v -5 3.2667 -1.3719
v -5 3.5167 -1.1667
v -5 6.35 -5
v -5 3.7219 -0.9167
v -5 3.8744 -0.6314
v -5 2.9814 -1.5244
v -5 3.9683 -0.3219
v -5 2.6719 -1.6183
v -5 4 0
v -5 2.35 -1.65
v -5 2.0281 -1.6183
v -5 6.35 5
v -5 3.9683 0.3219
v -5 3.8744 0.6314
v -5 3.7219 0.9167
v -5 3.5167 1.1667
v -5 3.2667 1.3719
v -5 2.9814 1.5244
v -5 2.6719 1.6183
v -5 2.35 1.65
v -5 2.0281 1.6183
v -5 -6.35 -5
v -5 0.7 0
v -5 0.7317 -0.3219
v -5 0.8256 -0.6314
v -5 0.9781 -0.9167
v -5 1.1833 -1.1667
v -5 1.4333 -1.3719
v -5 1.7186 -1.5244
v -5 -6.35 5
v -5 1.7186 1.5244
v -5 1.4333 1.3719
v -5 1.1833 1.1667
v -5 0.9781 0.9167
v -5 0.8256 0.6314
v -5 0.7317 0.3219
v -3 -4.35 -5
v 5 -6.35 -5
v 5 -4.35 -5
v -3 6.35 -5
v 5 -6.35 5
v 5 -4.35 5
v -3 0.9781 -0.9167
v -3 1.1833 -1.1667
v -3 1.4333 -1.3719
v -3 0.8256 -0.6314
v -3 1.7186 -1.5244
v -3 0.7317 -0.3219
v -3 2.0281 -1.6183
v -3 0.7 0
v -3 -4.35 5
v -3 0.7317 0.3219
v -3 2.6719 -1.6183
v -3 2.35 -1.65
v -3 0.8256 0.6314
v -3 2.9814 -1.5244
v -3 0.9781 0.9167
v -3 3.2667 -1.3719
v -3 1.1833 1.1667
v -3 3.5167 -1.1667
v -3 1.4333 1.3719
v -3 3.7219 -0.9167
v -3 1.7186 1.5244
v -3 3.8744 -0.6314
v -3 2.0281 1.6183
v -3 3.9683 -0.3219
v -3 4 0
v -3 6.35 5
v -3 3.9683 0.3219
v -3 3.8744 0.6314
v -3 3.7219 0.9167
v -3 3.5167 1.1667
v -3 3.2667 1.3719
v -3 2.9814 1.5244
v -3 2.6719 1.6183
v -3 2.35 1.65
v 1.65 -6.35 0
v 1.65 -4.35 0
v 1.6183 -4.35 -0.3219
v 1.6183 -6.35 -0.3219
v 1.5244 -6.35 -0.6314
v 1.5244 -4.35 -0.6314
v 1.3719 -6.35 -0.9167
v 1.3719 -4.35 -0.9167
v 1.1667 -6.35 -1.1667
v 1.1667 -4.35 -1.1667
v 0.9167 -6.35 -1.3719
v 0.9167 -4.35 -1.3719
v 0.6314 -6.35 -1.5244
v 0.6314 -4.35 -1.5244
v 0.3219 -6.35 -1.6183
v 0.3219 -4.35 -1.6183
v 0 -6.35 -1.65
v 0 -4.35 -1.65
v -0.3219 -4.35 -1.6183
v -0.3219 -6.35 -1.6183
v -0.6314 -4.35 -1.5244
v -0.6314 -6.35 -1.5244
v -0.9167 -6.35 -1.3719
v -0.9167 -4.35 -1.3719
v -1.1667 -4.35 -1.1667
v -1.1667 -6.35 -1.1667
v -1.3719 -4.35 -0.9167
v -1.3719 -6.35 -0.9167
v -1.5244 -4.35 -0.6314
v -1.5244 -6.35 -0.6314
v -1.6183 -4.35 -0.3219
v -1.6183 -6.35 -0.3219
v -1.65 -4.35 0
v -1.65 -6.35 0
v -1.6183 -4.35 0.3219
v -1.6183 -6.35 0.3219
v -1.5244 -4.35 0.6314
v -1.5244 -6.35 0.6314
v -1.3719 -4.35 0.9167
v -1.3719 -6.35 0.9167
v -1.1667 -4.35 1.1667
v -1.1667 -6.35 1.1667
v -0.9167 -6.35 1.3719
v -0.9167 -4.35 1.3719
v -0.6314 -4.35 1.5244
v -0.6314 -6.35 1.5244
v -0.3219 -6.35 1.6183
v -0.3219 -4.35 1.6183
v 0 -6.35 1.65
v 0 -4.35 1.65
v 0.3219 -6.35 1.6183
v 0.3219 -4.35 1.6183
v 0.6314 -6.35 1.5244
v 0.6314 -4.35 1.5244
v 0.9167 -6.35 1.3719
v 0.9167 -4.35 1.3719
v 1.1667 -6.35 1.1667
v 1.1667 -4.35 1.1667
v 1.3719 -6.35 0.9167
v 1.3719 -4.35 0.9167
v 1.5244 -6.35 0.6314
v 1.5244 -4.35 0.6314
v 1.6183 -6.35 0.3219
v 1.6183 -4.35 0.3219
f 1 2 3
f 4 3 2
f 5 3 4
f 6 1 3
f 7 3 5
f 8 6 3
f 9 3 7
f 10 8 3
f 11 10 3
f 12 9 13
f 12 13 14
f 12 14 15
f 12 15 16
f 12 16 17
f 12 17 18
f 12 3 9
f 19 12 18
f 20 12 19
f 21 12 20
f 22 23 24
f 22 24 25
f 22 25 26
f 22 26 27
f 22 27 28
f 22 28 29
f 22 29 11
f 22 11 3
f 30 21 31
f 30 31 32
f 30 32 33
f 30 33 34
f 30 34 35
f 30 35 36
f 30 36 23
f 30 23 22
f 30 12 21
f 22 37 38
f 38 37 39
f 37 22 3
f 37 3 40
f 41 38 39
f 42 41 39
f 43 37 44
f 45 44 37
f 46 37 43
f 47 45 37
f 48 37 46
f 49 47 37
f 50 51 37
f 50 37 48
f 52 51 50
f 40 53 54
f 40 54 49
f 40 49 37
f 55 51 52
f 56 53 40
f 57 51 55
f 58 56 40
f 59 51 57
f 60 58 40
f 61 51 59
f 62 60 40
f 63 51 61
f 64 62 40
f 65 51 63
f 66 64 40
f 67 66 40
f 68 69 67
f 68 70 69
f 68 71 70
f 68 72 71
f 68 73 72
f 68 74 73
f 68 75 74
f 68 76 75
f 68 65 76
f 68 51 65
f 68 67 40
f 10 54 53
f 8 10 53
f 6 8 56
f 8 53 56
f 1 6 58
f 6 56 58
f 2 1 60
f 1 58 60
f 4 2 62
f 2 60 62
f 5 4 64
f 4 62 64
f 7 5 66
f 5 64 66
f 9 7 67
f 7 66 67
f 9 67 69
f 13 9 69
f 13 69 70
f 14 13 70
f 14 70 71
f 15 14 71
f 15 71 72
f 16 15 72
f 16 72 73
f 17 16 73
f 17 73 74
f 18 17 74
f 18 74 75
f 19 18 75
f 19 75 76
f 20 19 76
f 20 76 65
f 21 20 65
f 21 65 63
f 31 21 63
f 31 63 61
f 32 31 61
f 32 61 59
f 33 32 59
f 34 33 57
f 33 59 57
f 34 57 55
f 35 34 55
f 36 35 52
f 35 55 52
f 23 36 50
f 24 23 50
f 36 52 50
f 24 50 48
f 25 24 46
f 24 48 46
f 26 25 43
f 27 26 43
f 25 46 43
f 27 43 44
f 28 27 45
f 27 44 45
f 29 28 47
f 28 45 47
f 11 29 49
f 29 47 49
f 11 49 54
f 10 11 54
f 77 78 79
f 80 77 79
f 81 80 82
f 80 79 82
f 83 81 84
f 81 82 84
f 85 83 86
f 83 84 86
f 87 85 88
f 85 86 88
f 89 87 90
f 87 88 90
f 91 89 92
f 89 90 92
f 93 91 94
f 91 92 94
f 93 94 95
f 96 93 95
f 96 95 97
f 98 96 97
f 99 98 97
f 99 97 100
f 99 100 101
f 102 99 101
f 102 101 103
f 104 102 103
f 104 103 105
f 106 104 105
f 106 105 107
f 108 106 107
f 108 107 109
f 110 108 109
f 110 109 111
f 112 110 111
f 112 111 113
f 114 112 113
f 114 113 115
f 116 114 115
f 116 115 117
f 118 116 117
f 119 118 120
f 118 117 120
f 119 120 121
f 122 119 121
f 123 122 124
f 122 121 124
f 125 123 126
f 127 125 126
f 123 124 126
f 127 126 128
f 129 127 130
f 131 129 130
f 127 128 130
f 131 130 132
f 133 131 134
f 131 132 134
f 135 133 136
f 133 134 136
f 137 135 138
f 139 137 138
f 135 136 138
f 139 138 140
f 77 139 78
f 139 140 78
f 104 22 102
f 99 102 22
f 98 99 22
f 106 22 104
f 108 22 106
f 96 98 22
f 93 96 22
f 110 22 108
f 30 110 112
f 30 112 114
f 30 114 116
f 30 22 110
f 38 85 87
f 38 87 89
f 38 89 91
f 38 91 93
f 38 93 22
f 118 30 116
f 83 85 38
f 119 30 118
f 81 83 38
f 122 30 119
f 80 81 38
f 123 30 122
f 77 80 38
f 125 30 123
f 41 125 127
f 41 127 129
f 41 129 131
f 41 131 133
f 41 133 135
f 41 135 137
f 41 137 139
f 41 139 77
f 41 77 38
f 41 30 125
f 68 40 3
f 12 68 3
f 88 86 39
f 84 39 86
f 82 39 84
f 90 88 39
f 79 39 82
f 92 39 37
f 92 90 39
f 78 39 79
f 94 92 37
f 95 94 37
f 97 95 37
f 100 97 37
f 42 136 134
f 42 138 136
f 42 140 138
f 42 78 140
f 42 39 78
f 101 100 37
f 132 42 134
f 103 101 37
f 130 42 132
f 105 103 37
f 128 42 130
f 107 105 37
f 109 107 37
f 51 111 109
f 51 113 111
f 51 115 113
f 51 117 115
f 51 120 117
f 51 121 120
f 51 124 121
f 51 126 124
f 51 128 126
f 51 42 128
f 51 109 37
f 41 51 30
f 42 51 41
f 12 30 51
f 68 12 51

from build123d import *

# Parameters (mm, degrees)
BOSS_EXTRUDE1_DEPTH = 5
SKETCH2_R           = 1.65
CUT_EXTRUDE1_DEPTH  = 3
SKETCH3_R           = 1.65
CUT_EXTRUDE2_DEPTH  = 10


with BuildPart() as part:
    # Sketch1 → Boss-Extrude1 (new body, symmetric)
    with BuildSketch(Plane.XY):
        Polygon((-5, 6.35), (-5, -6.35), (5, -6.35), (5, -4.35), (-3, -4.35), (-3, 6.35), align=None)
    extrude(amount=BOSS_EXTRUDE1_DEPTH, both=True)

    # Sketch2 → Cut-Extrude1 (cut, through all)
    with BuildSketch(Plane(origin=(0, -4.35, 0), x_dir=(1, 0, 0), z_dir=(0, 1, 0))):
        Circle(SKETCH2_R)
    extrude(amount=-CUT_EXTRUDE1_DEPTH, mode=Mode.SUBTRACT)

    # Sketch3 → Cut-Extrude2 (cut)
    with BuildSketch(Plane(origin=(-3, 0, 0), x_dir=(0, 0, -1), z_dir=(1, 0, 0))):
        with Locations((0, 2.35)):
            Circle(SKETCH3_R)
    extrude(amount=-CUT_EXTRUDE2_DEPTH, mode=Mode.SUBTRACT)


solid = part.part
